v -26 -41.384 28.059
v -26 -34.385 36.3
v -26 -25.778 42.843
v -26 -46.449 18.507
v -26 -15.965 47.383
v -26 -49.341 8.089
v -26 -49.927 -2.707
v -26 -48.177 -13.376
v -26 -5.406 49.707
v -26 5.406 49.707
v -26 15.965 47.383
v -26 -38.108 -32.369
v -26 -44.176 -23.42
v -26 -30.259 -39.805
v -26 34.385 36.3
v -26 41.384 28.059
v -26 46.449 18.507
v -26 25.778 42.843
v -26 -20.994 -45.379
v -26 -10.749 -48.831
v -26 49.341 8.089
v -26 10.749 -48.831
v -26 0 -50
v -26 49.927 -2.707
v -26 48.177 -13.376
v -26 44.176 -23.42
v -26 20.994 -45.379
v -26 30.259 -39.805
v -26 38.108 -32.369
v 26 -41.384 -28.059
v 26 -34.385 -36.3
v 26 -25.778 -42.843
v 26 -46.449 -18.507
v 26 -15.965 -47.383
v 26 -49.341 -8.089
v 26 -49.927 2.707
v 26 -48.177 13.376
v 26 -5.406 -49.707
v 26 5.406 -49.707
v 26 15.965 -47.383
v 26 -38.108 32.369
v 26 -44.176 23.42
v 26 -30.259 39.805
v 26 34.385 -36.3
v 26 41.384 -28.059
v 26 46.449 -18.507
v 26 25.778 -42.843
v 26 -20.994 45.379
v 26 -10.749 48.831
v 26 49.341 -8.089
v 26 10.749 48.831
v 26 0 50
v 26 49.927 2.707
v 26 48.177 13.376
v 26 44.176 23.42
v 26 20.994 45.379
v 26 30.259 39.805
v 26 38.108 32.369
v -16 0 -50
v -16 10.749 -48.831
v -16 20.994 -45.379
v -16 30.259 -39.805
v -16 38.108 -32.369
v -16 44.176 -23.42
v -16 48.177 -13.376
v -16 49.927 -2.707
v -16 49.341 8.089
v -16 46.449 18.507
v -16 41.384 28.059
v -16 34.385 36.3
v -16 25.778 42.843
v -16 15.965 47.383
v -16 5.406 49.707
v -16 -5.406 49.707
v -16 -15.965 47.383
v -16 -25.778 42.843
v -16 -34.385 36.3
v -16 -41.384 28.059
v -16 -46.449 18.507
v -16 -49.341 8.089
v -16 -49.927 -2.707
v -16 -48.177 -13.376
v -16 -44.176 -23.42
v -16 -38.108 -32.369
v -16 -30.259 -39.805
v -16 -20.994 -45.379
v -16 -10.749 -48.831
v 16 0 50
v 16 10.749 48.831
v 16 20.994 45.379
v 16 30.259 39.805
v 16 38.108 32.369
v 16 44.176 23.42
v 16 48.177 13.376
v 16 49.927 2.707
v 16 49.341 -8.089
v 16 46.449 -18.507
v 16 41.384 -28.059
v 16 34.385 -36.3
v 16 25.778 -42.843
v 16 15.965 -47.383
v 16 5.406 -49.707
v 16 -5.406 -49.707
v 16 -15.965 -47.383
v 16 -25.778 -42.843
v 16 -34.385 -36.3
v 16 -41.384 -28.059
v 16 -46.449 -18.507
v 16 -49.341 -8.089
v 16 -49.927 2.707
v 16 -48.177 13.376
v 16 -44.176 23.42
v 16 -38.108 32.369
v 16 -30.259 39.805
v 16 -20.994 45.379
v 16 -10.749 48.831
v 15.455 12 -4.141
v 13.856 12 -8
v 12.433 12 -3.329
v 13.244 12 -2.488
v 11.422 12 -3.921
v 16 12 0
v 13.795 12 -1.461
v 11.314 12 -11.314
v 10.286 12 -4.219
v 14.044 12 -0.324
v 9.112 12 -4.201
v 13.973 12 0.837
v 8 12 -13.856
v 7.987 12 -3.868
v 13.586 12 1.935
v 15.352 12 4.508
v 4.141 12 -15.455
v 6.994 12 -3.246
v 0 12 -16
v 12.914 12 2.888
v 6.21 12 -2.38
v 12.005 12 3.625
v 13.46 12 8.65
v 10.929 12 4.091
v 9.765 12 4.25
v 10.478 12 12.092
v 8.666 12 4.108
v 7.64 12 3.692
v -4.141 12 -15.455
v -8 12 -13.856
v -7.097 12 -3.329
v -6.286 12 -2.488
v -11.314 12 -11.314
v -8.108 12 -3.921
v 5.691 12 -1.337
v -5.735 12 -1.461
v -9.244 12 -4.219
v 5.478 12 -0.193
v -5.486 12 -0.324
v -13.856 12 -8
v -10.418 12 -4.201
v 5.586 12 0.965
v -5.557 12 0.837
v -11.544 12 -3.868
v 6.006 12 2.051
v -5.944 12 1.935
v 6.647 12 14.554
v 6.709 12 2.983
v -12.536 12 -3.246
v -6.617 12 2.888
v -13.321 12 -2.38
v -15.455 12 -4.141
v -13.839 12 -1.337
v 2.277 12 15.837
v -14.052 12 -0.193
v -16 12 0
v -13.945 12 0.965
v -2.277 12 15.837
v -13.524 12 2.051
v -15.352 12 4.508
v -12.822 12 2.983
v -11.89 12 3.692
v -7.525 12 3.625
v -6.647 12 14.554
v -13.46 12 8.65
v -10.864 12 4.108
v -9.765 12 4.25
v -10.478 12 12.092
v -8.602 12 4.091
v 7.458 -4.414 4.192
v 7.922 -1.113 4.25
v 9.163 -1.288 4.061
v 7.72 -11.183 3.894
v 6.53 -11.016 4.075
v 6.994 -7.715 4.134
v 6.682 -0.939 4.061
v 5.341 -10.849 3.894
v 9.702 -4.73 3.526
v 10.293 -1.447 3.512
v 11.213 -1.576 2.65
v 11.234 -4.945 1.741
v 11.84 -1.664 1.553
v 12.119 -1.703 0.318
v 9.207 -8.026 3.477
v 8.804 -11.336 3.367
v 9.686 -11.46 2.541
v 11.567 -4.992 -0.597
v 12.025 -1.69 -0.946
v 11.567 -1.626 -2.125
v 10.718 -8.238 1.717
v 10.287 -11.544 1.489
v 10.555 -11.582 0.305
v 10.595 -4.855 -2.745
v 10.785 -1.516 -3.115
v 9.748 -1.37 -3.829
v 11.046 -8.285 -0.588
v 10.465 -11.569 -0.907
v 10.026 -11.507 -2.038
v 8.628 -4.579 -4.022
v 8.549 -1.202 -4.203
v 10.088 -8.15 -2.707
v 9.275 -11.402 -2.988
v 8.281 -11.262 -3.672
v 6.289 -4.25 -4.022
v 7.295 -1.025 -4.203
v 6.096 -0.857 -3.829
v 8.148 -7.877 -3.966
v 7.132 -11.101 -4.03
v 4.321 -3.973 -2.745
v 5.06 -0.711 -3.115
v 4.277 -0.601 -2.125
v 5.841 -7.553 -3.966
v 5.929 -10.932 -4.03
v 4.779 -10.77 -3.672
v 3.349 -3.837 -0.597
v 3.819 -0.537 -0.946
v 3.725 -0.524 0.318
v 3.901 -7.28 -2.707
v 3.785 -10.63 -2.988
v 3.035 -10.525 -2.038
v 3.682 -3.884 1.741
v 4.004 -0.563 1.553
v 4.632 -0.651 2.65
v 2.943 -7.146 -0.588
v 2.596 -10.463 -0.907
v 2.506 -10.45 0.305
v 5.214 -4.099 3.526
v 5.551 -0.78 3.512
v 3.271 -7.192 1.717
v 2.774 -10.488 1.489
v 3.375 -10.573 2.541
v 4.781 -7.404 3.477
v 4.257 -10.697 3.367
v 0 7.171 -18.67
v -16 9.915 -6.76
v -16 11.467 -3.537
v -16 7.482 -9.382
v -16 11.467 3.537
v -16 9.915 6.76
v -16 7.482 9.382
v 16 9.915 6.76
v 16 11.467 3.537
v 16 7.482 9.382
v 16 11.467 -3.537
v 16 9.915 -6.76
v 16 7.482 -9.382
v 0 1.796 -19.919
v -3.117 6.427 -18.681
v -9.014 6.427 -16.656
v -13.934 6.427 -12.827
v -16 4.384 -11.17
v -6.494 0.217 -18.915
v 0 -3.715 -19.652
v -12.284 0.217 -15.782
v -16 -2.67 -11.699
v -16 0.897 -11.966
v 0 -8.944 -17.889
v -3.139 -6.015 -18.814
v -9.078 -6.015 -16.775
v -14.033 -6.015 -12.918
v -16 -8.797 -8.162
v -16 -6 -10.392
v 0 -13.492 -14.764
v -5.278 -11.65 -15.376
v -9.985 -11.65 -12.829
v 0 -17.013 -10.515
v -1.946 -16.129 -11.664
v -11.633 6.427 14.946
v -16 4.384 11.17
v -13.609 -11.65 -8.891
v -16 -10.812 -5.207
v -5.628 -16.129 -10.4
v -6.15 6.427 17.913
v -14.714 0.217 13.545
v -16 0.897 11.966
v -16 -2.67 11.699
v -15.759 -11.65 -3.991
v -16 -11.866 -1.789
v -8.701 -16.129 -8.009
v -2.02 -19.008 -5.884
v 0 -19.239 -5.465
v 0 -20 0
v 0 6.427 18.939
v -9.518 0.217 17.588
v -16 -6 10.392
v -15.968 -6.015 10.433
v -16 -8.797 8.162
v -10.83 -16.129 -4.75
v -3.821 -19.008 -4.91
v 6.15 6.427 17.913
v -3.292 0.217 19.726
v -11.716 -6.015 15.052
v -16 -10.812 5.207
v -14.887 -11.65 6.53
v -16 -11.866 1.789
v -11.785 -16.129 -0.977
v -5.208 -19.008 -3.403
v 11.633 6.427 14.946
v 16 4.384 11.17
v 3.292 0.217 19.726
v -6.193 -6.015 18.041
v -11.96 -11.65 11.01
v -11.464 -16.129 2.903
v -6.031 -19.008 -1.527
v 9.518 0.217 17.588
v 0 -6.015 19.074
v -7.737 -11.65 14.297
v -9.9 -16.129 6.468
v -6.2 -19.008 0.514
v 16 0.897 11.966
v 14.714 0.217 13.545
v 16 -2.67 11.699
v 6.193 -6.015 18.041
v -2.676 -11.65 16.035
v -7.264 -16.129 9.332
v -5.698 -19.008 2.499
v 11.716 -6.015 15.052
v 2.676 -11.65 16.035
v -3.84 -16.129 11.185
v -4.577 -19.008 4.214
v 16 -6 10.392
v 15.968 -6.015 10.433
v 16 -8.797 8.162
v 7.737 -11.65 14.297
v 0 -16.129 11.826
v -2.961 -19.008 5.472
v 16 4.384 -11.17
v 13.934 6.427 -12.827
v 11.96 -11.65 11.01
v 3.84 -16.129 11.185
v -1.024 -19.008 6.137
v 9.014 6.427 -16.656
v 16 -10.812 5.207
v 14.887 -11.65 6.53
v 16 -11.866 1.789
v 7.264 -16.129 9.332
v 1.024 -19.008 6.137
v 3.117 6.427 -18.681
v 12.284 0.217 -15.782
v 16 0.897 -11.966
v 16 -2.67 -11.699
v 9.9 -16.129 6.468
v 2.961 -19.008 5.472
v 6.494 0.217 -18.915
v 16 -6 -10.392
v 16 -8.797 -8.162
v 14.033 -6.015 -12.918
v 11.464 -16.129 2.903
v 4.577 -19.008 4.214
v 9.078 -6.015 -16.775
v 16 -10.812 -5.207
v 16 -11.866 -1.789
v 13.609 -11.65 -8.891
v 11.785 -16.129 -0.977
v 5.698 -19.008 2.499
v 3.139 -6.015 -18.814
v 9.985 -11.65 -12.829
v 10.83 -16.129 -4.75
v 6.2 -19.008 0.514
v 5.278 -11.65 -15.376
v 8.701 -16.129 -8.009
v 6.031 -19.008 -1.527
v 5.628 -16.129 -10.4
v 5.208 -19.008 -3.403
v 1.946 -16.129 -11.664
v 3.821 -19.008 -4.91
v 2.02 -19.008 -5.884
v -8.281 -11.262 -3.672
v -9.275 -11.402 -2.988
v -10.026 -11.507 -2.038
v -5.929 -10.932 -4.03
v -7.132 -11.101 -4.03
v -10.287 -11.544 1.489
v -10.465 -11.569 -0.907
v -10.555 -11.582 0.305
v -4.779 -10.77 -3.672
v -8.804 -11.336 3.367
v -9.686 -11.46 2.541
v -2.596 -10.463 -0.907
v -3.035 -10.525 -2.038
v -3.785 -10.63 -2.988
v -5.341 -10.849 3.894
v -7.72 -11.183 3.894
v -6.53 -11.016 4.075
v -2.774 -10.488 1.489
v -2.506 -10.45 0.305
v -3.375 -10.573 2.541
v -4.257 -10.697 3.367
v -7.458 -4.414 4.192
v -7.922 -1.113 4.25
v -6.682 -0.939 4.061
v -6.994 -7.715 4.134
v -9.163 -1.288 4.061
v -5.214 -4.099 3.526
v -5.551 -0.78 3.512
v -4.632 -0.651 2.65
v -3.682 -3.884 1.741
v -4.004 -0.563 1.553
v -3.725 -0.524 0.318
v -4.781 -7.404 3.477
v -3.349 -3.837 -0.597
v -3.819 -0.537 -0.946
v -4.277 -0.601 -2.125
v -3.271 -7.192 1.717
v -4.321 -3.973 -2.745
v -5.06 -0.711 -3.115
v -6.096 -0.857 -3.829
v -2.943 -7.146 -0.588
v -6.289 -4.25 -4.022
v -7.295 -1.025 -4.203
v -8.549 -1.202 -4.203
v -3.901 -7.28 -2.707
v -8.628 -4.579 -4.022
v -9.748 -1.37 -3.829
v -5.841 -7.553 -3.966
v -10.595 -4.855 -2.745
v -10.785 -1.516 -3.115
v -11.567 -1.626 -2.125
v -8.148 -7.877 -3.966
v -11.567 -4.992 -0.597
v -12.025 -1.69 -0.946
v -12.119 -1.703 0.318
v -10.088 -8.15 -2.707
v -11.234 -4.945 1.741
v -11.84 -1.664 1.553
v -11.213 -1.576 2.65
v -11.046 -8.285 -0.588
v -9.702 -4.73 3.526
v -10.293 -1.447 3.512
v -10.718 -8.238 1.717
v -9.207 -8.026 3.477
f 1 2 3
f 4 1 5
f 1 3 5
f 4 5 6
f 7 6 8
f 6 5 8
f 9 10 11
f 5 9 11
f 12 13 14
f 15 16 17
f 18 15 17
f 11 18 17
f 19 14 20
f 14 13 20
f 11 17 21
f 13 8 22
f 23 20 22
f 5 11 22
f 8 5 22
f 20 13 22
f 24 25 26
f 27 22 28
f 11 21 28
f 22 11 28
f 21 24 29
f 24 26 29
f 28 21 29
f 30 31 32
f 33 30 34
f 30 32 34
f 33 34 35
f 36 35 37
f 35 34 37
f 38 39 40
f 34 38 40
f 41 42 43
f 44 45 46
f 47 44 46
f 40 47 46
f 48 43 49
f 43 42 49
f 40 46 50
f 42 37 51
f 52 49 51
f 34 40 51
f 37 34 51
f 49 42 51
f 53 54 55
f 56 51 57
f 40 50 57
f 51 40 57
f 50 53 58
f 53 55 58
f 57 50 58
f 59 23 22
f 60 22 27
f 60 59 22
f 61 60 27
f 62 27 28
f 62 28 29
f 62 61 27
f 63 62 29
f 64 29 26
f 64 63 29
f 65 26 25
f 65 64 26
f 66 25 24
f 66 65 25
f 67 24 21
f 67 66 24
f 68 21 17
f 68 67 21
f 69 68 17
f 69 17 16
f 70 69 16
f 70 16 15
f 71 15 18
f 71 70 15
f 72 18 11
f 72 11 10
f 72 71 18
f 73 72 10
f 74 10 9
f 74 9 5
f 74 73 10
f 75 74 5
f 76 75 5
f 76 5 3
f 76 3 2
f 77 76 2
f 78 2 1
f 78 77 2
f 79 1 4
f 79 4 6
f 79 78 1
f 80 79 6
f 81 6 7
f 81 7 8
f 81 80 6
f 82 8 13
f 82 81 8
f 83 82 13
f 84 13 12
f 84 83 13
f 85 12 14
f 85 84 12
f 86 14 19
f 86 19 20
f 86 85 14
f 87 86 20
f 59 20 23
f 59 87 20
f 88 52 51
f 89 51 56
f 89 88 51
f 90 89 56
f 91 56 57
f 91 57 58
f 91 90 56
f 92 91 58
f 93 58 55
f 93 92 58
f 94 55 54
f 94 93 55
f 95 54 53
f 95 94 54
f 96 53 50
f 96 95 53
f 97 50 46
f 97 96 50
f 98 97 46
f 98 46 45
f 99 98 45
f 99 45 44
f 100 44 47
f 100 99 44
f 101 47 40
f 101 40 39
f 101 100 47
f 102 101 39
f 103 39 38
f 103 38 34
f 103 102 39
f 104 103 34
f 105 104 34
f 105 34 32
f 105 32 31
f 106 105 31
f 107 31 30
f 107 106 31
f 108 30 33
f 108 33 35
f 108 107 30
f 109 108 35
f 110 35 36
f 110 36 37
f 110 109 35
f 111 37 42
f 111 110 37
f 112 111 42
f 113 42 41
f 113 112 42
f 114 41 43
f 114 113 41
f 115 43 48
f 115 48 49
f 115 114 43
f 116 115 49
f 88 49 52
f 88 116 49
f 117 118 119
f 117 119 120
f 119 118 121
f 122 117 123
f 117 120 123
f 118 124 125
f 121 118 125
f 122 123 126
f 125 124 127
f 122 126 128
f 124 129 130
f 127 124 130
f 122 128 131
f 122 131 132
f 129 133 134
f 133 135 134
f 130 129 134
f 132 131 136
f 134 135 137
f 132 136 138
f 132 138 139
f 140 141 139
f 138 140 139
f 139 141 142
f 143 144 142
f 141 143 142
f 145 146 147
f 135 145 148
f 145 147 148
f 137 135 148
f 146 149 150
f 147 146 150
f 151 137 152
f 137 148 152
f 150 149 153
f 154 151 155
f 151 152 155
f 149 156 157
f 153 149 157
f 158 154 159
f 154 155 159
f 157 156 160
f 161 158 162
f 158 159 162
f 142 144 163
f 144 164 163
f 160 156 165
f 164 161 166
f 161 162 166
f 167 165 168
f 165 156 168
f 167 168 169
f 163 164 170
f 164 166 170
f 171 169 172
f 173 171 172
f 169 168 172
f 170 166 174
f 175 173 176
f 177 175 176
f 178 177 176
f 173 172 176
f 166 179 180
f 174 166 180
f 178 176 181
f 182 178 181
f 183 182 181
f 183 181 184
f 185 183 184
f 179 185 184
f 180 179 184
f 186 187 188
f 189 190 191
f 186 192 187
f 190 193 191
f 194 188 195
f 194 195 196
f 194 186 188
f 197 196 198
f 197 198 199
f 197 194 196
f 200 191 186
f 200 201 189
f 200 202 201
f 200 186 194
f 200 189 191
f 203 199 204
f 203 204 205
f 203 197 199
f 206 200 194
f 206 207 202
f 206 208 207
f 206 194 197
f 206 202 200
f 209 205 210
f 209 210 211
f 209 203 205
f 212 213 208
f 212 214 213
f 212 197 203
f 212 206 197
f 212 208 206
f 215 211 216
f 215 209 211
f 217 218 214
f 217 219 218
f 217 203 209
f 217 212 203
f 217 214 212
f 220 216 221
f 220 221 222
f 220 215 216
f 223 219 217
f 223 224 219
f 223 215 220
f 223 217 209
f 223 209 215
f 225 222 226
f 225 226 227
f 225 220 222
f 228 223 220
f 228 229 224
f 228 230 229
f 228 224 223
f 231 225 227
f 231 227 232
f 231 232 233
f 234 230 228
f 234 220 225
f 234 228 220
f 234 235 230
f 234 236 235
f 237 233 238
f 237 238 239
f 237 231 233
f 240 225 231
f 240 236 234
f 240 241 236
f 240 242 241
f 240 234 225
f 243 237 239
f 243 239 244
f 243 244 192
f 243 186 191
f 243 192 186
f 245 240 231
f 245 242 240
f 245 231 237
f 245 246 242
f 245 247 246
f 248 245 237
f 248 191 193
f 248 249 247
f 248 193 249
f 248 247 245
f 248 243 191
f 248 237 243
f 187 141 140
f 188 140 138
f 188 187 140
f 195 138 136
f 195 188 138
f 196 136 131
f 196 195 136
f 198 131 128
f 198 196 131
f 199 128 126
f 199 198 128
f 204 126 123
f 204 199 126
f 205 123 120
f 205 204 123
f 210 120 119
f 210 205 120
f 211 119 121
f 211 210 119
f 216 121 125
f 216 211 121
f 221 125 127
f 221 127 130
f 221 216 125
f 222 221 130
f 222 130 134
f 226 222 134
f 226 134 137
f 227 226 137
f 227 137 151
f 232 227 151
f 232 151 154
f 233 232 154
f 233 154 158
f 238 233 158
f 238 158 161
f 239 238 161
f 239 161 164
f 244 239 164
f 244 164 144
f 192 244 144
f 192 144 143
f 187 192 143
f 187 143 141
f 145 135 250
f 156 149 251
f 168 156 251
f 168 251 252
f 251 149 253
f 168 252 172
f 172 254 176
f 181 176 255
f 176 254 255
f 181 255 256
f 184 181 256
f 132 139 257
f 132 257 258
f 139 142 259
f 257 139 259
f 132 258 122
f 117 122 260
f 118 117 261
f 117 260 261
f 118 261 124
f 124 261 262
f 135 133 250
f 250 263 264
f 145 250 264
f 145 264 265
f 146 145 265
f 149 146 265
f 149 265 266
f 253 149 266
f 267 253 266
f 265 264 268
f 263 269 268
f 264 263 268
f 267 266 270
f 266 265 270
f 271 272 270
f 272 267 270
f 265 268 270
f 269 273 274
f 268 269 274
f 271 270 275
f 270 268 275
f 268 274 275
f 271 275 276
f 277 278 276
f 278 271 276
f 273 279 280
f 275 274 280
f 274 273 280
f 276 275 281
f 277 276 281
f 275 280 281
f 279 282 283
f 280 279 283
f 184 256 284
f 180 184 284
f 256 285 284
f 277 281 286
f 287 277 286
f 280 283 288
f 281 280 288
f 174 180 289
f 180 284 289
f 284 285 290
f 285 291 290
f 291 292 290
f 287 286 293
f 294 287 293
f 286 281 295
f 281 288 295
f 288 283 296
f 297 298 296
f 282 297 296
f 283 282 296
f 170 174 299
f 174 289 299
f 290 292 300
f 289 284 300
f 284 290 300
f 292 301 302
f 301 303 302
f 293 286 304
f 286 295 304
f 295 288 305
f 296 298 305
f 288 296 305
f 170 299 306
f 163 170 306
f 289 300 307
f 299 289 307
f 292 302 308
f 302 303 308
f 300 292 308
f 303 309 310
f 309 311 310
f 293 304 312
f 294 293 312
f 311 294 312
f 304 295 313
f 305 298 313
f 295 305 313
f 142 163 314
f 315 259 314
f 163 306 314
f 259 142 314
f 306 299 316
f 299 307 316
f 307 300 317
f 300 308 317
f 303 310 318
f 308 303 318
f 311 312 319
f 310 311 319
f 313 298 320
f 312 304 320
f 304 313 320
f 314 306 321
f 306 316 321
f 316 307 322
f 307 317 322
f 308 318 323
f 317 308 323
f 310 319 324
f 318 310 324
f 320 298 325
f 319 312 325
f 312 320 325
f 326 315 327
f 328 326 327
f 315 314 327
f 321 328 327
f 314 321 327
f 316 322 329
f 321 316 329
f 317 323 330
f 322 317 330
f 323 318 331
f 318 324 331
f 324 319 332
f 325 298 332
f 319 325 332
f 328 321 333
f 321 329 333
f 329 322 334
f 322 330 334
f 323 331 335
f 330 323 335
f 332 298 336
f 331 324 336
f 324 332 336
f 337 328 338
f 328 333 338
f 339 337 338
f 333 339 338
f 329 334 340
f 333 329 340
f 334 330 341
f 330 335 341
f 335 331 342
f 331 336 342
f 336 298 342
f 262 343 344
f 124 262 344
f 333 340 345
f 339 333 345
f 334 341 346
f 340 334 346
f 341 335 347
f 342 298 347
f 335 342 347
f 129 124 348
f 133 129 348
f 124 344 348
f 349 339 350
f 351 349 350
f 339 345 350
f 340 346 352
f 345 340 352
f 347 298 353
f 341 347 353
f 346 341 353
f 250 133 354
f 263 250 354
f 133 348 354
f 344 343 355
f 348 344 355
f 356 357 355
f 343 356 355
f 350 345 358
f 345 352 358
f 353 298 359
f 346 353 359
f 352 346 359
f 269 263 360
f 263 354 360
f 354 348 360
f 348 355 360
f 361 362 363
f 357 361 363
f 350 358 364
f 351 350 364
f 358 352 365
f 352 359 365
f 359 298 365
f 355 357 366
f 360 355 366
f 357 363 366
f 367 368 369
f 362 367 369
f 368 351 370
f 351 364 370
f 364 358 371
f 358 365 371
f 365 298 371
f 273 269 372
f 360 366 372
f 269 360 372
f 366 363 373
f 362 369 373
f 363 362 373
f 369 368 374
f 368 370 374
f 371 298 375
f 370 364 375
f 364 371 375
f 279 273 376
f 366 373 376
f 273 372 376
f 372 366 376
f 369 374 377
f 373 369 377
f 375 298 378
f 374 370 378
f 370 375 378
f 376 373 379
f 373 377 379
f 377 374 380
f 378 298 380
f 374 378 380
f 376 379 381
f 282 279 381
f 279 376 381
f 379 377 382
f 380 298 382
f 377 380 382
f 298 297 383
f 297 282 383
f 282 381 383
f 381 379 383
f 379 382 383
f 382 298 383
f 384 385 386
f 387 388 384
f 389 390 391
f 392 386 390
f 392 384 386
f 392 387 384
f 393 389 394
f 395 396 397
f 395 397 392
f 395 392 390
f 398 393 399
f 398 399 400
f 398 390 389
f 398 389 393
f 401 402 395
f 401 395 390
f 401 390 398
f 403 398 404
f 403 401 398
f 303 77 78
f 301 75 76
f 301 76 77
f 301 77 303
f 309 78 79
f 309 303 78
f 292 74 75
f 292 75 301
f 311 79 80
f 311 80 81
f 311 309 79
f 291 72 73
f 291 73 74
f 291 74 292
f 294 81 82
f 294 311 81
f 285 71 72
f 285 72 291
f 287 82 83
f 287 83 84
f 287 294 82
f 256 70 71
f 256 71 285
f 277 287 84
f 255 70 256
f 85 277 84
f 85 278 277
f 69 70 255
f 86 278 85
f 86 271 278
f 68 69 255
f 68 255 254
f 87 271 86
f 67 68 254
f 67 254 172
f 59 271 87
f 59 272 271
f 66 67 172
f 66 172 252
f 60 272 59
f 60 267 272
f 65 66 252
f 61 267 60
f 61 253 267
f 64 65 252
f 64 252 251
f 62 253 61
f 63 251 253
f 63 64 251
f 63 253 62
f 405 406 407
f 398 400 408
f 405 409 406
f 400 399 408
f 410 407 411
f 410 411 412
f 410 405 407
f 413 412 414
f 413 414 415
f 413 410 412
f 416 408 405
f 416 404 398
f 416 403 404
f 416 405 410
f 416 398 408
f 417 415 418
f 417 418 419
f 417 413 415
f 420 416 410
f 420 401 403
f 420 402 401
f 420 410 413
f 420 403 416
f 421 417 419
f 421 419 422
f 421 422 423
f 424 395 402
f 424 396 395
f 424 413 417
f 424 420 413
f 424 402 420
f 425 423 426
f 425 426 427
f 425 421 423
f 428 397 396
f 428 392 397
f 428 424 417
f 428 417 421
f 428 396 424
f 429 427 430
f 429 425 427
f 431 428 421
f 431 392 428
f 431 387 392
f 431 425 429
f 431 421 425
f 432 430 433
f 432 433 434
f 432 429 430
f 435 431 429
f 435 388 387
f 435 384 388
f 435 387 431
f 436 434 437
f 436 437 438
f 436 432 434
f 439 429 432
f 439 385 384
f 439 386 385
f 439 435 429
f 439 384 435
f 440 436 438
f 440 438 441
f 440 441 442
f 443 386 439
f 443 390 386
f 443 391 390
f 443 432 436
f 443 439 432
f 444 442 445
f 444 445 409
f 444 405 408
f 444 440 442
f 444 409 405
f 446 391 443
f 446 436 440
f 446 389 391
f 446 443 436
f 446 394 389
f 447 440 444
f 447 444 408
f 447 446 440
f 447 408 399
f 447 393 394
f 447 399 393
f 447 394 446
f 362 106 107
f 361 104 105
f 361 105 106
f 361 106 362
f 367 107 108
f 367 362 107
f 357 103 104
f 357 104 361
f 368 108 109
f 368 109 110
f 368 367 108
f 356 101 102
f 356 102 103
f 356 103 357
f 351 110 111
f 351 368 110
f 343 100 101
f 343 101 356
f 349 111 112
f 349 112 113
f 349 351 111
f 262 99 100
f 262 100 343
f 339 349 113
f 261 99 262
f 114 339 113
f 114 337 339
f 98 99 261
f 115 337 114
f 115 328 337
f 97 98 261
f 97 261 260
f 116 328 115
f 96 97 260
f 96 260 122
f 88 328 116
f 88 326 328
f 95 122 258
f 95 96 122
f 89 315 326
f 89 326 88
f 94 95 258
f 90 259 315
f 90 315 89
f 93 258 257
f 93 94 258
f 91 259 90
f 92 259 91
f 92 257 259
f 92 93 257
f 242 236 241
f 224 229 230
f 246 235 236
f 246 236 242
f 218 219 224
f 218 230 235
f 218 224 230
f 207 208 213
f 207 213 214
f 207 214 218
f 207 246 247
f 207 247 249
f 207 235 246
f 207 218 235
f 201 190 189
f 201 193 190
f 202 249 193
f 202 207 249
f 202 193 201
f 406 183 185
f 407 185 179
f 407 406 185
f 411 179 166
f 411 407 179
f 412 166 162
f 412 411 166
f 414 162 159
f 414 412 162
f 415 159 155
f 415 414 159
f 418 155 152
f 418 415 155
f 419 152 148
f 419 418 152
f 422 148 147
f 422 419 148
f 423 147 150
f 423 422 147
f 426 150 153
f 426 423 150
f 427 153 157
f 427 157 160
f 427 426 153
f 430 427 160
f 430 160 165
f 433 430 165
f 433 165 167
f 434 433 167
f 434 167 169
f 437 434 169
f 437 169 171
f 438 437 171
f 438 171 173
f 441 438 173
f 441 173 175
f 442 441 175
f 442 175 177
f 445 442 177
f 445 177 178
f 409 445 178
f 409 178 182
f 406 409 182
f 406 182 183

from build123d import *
from OCP.BRepFilletAPI import BRepFilletAPI_MakeChamfer

# Parameters (mm, degrees)
CUT_EXTRUDE1_DEPTH      = 35.641016151
CUT_EXTRUDE1_DEPTH_BACK = 10
SKETCH2_R               = 4.25
CUT_EXTRUDE2_DEPTH      = 35.641016151
CUT_EXTRUDE2_DEPTH_BACK = 10
SKETCH3_R               = 4.25
CHAMFER1_SIZE           = 10
CHAMFER1_SIZE2          = 0.174550649
SKETCH4_OUTSIDE_W       = 54.998
SKETCH4_OUTSIDE_H       = 54.998
SKETCH4_OUTSIDE_W_2     = 32
SKETCH4_OUTSIDE_H_2     = 40
CUT_EXTRUDE3_DEPTH      = 43.708313008
SKETCH5_R               = 50
BOSS_EXTRUDE1_DEPTH     = 10
BOSS_EXTRUDE2_START     = -10
SKETCH6_R               = 50
BOSS_EXTRUDE2_DEPTH     = 10


with BuildPart() as part:
    # Sketch1 → Revolve2 (revolve)
    with BuildSketch(Plane(origin=(0, 0, 0), x_dir=(0, 0, -1), z_dir=(1, 0, 0))):
        with BuildLine():
            Line((0, 12), (16, 12))
            ThreePointArc((16, 12), (17.88854382, -8.94427191), (0, -20))
            Line((0, -20), (0, 12))
        make_face()
    revolve(axis=Axis((0, -20, 0), (0, 1, 0)))

    # Sketch2 → Cut-Extrude1 (cut, two sides: drawn at the far end of the back side and taken through both)
    with BuildSketch(Plane(origin=(0, 0, 0), x_dir=(0, 0, 1), z_dir=(0.13917310096006574, 0.9902680687415703, 0)).offset(-CUT_EXTRUDE1_DEPTH_BACK)):
        with Locations((0, 8)):
            Circle(SKETCH2_R)
    extrude(amount=CUT_EXTRUDE1_DEPTH + CUT_EXTRUDE1_DEPTH_BACK, mode=Mode.SUBTRACT)

    # Sketch3 → Cut-Extrude2 (cut, two sides: drawn at the far end of the back side and taken through both)
    with BuildSketch(Plane(origin=(0, 0, 0), x_dir=(0, 0, 1), z_dir=(-0.13917310096006574, 0.9902680687415703, 0)).offset(-CUT_EXTRUDE2_DEPTH_BACK)):
        with Locations((0, -8)):
            Circle(SKETCH3_R)
    extrude(amount=CUT_EXTRUDE2_DEPTH + CUT_EXTRUDE2_DEPTH_BACK, mode=Mode.SUBTRACT)

    # Chamfer1: one chamfer whose edges measure the first distance from different faces: ONE call of the kernel's chamfer builder (chamfer() names one face for all edges)
    chamfer1_edges_1 = [part.edges().sort_by_distance(p)[0] for p in [
        (6.53041354, -11.016065495, -4.25),
    ]]
    chamfer1_side_1 = [part.faces().sort_by_distance(p)[0] for p in [
        (8.197713558, 0.847390567, -4.25),
    ]]
    chamfer1_edges_2 = [part.edges().sort_by_distance(p)[0] for p in [
        (-6.53041354, -11.016065495, -4.25),
    ]]
    chamfer1_side_2 = [part.faces().sort_by_distance(p)[0] for p in [
        (-8.197713558, 0.847390567, -4.25),
    ]]
    chamfer1 = BRepFilletAPI_MakeChamfer(part.part.solid().wrapped)
    for e in chamfer1_edges_1:
        chamfer1.Add(CHAMFER1_SIZE, CHAMFER1_SIZE2, e.wrapped, chamfer1_side_1[0].wrapped)  # the first distance lies on this face
    for e in chamfer1_edges_2:
        chamfer1.Add(CHAMFER1_SIZE, CHAMFER1_SIZE2, e.wrapped, chamfer1_side_2[0].wrapped)  # the first distance lies on this face
    add(Compound.cast(chamfer1.Shape()), mode=Mode.REPLACE)

    # Sketch4 outside → Cut-Extrude3 (cut, through all)
    with BuildSketch(Plane(origin=(0, 12, 0), x_dir=(1, 0, 0), z_dir=(0, 1, 0))):
        Rectangle(SKETCH4_OUTSIDE_W, SKETCH4_OUTSIDE_H)
        Rectangle(SKETCH4_OUTSIDE_W_2, SKETCH4_OUTSIDE_H_2, mode=Mode.SUBTRACT)
    extrude(amount=-CUT_EXTRUDE3_DEPTH, mode=Mode.SUBTRACT)

    # Sketch5 → Boss-Extrude1 (add)
    with BuildSketch(Plane(origin=(-16, 0, -32), x_dir=(0, 0, -1), z_dir=(1, 0, 0))):
        with Locations((-32, 0)):
            Circle(SKETCH5_R)
    extrude(amount=-BOSS_EXTRUDE1_DEPTH)

    # Sketch6 → Boss-Extrude2 (add)
    with BuildSketch(Plane(origin=(16, 0, 32), x_dir=(0, 0, 1), z_dir=(-1, 0, 0)).offset(BOSS_EXTRUDE2_START)):
        with Locations((-32, 0)):
            Circle(SKETCH6_R)
    extrude(amount=BOSS_EXTRUDE2_DEPTH)


solid = part.part
